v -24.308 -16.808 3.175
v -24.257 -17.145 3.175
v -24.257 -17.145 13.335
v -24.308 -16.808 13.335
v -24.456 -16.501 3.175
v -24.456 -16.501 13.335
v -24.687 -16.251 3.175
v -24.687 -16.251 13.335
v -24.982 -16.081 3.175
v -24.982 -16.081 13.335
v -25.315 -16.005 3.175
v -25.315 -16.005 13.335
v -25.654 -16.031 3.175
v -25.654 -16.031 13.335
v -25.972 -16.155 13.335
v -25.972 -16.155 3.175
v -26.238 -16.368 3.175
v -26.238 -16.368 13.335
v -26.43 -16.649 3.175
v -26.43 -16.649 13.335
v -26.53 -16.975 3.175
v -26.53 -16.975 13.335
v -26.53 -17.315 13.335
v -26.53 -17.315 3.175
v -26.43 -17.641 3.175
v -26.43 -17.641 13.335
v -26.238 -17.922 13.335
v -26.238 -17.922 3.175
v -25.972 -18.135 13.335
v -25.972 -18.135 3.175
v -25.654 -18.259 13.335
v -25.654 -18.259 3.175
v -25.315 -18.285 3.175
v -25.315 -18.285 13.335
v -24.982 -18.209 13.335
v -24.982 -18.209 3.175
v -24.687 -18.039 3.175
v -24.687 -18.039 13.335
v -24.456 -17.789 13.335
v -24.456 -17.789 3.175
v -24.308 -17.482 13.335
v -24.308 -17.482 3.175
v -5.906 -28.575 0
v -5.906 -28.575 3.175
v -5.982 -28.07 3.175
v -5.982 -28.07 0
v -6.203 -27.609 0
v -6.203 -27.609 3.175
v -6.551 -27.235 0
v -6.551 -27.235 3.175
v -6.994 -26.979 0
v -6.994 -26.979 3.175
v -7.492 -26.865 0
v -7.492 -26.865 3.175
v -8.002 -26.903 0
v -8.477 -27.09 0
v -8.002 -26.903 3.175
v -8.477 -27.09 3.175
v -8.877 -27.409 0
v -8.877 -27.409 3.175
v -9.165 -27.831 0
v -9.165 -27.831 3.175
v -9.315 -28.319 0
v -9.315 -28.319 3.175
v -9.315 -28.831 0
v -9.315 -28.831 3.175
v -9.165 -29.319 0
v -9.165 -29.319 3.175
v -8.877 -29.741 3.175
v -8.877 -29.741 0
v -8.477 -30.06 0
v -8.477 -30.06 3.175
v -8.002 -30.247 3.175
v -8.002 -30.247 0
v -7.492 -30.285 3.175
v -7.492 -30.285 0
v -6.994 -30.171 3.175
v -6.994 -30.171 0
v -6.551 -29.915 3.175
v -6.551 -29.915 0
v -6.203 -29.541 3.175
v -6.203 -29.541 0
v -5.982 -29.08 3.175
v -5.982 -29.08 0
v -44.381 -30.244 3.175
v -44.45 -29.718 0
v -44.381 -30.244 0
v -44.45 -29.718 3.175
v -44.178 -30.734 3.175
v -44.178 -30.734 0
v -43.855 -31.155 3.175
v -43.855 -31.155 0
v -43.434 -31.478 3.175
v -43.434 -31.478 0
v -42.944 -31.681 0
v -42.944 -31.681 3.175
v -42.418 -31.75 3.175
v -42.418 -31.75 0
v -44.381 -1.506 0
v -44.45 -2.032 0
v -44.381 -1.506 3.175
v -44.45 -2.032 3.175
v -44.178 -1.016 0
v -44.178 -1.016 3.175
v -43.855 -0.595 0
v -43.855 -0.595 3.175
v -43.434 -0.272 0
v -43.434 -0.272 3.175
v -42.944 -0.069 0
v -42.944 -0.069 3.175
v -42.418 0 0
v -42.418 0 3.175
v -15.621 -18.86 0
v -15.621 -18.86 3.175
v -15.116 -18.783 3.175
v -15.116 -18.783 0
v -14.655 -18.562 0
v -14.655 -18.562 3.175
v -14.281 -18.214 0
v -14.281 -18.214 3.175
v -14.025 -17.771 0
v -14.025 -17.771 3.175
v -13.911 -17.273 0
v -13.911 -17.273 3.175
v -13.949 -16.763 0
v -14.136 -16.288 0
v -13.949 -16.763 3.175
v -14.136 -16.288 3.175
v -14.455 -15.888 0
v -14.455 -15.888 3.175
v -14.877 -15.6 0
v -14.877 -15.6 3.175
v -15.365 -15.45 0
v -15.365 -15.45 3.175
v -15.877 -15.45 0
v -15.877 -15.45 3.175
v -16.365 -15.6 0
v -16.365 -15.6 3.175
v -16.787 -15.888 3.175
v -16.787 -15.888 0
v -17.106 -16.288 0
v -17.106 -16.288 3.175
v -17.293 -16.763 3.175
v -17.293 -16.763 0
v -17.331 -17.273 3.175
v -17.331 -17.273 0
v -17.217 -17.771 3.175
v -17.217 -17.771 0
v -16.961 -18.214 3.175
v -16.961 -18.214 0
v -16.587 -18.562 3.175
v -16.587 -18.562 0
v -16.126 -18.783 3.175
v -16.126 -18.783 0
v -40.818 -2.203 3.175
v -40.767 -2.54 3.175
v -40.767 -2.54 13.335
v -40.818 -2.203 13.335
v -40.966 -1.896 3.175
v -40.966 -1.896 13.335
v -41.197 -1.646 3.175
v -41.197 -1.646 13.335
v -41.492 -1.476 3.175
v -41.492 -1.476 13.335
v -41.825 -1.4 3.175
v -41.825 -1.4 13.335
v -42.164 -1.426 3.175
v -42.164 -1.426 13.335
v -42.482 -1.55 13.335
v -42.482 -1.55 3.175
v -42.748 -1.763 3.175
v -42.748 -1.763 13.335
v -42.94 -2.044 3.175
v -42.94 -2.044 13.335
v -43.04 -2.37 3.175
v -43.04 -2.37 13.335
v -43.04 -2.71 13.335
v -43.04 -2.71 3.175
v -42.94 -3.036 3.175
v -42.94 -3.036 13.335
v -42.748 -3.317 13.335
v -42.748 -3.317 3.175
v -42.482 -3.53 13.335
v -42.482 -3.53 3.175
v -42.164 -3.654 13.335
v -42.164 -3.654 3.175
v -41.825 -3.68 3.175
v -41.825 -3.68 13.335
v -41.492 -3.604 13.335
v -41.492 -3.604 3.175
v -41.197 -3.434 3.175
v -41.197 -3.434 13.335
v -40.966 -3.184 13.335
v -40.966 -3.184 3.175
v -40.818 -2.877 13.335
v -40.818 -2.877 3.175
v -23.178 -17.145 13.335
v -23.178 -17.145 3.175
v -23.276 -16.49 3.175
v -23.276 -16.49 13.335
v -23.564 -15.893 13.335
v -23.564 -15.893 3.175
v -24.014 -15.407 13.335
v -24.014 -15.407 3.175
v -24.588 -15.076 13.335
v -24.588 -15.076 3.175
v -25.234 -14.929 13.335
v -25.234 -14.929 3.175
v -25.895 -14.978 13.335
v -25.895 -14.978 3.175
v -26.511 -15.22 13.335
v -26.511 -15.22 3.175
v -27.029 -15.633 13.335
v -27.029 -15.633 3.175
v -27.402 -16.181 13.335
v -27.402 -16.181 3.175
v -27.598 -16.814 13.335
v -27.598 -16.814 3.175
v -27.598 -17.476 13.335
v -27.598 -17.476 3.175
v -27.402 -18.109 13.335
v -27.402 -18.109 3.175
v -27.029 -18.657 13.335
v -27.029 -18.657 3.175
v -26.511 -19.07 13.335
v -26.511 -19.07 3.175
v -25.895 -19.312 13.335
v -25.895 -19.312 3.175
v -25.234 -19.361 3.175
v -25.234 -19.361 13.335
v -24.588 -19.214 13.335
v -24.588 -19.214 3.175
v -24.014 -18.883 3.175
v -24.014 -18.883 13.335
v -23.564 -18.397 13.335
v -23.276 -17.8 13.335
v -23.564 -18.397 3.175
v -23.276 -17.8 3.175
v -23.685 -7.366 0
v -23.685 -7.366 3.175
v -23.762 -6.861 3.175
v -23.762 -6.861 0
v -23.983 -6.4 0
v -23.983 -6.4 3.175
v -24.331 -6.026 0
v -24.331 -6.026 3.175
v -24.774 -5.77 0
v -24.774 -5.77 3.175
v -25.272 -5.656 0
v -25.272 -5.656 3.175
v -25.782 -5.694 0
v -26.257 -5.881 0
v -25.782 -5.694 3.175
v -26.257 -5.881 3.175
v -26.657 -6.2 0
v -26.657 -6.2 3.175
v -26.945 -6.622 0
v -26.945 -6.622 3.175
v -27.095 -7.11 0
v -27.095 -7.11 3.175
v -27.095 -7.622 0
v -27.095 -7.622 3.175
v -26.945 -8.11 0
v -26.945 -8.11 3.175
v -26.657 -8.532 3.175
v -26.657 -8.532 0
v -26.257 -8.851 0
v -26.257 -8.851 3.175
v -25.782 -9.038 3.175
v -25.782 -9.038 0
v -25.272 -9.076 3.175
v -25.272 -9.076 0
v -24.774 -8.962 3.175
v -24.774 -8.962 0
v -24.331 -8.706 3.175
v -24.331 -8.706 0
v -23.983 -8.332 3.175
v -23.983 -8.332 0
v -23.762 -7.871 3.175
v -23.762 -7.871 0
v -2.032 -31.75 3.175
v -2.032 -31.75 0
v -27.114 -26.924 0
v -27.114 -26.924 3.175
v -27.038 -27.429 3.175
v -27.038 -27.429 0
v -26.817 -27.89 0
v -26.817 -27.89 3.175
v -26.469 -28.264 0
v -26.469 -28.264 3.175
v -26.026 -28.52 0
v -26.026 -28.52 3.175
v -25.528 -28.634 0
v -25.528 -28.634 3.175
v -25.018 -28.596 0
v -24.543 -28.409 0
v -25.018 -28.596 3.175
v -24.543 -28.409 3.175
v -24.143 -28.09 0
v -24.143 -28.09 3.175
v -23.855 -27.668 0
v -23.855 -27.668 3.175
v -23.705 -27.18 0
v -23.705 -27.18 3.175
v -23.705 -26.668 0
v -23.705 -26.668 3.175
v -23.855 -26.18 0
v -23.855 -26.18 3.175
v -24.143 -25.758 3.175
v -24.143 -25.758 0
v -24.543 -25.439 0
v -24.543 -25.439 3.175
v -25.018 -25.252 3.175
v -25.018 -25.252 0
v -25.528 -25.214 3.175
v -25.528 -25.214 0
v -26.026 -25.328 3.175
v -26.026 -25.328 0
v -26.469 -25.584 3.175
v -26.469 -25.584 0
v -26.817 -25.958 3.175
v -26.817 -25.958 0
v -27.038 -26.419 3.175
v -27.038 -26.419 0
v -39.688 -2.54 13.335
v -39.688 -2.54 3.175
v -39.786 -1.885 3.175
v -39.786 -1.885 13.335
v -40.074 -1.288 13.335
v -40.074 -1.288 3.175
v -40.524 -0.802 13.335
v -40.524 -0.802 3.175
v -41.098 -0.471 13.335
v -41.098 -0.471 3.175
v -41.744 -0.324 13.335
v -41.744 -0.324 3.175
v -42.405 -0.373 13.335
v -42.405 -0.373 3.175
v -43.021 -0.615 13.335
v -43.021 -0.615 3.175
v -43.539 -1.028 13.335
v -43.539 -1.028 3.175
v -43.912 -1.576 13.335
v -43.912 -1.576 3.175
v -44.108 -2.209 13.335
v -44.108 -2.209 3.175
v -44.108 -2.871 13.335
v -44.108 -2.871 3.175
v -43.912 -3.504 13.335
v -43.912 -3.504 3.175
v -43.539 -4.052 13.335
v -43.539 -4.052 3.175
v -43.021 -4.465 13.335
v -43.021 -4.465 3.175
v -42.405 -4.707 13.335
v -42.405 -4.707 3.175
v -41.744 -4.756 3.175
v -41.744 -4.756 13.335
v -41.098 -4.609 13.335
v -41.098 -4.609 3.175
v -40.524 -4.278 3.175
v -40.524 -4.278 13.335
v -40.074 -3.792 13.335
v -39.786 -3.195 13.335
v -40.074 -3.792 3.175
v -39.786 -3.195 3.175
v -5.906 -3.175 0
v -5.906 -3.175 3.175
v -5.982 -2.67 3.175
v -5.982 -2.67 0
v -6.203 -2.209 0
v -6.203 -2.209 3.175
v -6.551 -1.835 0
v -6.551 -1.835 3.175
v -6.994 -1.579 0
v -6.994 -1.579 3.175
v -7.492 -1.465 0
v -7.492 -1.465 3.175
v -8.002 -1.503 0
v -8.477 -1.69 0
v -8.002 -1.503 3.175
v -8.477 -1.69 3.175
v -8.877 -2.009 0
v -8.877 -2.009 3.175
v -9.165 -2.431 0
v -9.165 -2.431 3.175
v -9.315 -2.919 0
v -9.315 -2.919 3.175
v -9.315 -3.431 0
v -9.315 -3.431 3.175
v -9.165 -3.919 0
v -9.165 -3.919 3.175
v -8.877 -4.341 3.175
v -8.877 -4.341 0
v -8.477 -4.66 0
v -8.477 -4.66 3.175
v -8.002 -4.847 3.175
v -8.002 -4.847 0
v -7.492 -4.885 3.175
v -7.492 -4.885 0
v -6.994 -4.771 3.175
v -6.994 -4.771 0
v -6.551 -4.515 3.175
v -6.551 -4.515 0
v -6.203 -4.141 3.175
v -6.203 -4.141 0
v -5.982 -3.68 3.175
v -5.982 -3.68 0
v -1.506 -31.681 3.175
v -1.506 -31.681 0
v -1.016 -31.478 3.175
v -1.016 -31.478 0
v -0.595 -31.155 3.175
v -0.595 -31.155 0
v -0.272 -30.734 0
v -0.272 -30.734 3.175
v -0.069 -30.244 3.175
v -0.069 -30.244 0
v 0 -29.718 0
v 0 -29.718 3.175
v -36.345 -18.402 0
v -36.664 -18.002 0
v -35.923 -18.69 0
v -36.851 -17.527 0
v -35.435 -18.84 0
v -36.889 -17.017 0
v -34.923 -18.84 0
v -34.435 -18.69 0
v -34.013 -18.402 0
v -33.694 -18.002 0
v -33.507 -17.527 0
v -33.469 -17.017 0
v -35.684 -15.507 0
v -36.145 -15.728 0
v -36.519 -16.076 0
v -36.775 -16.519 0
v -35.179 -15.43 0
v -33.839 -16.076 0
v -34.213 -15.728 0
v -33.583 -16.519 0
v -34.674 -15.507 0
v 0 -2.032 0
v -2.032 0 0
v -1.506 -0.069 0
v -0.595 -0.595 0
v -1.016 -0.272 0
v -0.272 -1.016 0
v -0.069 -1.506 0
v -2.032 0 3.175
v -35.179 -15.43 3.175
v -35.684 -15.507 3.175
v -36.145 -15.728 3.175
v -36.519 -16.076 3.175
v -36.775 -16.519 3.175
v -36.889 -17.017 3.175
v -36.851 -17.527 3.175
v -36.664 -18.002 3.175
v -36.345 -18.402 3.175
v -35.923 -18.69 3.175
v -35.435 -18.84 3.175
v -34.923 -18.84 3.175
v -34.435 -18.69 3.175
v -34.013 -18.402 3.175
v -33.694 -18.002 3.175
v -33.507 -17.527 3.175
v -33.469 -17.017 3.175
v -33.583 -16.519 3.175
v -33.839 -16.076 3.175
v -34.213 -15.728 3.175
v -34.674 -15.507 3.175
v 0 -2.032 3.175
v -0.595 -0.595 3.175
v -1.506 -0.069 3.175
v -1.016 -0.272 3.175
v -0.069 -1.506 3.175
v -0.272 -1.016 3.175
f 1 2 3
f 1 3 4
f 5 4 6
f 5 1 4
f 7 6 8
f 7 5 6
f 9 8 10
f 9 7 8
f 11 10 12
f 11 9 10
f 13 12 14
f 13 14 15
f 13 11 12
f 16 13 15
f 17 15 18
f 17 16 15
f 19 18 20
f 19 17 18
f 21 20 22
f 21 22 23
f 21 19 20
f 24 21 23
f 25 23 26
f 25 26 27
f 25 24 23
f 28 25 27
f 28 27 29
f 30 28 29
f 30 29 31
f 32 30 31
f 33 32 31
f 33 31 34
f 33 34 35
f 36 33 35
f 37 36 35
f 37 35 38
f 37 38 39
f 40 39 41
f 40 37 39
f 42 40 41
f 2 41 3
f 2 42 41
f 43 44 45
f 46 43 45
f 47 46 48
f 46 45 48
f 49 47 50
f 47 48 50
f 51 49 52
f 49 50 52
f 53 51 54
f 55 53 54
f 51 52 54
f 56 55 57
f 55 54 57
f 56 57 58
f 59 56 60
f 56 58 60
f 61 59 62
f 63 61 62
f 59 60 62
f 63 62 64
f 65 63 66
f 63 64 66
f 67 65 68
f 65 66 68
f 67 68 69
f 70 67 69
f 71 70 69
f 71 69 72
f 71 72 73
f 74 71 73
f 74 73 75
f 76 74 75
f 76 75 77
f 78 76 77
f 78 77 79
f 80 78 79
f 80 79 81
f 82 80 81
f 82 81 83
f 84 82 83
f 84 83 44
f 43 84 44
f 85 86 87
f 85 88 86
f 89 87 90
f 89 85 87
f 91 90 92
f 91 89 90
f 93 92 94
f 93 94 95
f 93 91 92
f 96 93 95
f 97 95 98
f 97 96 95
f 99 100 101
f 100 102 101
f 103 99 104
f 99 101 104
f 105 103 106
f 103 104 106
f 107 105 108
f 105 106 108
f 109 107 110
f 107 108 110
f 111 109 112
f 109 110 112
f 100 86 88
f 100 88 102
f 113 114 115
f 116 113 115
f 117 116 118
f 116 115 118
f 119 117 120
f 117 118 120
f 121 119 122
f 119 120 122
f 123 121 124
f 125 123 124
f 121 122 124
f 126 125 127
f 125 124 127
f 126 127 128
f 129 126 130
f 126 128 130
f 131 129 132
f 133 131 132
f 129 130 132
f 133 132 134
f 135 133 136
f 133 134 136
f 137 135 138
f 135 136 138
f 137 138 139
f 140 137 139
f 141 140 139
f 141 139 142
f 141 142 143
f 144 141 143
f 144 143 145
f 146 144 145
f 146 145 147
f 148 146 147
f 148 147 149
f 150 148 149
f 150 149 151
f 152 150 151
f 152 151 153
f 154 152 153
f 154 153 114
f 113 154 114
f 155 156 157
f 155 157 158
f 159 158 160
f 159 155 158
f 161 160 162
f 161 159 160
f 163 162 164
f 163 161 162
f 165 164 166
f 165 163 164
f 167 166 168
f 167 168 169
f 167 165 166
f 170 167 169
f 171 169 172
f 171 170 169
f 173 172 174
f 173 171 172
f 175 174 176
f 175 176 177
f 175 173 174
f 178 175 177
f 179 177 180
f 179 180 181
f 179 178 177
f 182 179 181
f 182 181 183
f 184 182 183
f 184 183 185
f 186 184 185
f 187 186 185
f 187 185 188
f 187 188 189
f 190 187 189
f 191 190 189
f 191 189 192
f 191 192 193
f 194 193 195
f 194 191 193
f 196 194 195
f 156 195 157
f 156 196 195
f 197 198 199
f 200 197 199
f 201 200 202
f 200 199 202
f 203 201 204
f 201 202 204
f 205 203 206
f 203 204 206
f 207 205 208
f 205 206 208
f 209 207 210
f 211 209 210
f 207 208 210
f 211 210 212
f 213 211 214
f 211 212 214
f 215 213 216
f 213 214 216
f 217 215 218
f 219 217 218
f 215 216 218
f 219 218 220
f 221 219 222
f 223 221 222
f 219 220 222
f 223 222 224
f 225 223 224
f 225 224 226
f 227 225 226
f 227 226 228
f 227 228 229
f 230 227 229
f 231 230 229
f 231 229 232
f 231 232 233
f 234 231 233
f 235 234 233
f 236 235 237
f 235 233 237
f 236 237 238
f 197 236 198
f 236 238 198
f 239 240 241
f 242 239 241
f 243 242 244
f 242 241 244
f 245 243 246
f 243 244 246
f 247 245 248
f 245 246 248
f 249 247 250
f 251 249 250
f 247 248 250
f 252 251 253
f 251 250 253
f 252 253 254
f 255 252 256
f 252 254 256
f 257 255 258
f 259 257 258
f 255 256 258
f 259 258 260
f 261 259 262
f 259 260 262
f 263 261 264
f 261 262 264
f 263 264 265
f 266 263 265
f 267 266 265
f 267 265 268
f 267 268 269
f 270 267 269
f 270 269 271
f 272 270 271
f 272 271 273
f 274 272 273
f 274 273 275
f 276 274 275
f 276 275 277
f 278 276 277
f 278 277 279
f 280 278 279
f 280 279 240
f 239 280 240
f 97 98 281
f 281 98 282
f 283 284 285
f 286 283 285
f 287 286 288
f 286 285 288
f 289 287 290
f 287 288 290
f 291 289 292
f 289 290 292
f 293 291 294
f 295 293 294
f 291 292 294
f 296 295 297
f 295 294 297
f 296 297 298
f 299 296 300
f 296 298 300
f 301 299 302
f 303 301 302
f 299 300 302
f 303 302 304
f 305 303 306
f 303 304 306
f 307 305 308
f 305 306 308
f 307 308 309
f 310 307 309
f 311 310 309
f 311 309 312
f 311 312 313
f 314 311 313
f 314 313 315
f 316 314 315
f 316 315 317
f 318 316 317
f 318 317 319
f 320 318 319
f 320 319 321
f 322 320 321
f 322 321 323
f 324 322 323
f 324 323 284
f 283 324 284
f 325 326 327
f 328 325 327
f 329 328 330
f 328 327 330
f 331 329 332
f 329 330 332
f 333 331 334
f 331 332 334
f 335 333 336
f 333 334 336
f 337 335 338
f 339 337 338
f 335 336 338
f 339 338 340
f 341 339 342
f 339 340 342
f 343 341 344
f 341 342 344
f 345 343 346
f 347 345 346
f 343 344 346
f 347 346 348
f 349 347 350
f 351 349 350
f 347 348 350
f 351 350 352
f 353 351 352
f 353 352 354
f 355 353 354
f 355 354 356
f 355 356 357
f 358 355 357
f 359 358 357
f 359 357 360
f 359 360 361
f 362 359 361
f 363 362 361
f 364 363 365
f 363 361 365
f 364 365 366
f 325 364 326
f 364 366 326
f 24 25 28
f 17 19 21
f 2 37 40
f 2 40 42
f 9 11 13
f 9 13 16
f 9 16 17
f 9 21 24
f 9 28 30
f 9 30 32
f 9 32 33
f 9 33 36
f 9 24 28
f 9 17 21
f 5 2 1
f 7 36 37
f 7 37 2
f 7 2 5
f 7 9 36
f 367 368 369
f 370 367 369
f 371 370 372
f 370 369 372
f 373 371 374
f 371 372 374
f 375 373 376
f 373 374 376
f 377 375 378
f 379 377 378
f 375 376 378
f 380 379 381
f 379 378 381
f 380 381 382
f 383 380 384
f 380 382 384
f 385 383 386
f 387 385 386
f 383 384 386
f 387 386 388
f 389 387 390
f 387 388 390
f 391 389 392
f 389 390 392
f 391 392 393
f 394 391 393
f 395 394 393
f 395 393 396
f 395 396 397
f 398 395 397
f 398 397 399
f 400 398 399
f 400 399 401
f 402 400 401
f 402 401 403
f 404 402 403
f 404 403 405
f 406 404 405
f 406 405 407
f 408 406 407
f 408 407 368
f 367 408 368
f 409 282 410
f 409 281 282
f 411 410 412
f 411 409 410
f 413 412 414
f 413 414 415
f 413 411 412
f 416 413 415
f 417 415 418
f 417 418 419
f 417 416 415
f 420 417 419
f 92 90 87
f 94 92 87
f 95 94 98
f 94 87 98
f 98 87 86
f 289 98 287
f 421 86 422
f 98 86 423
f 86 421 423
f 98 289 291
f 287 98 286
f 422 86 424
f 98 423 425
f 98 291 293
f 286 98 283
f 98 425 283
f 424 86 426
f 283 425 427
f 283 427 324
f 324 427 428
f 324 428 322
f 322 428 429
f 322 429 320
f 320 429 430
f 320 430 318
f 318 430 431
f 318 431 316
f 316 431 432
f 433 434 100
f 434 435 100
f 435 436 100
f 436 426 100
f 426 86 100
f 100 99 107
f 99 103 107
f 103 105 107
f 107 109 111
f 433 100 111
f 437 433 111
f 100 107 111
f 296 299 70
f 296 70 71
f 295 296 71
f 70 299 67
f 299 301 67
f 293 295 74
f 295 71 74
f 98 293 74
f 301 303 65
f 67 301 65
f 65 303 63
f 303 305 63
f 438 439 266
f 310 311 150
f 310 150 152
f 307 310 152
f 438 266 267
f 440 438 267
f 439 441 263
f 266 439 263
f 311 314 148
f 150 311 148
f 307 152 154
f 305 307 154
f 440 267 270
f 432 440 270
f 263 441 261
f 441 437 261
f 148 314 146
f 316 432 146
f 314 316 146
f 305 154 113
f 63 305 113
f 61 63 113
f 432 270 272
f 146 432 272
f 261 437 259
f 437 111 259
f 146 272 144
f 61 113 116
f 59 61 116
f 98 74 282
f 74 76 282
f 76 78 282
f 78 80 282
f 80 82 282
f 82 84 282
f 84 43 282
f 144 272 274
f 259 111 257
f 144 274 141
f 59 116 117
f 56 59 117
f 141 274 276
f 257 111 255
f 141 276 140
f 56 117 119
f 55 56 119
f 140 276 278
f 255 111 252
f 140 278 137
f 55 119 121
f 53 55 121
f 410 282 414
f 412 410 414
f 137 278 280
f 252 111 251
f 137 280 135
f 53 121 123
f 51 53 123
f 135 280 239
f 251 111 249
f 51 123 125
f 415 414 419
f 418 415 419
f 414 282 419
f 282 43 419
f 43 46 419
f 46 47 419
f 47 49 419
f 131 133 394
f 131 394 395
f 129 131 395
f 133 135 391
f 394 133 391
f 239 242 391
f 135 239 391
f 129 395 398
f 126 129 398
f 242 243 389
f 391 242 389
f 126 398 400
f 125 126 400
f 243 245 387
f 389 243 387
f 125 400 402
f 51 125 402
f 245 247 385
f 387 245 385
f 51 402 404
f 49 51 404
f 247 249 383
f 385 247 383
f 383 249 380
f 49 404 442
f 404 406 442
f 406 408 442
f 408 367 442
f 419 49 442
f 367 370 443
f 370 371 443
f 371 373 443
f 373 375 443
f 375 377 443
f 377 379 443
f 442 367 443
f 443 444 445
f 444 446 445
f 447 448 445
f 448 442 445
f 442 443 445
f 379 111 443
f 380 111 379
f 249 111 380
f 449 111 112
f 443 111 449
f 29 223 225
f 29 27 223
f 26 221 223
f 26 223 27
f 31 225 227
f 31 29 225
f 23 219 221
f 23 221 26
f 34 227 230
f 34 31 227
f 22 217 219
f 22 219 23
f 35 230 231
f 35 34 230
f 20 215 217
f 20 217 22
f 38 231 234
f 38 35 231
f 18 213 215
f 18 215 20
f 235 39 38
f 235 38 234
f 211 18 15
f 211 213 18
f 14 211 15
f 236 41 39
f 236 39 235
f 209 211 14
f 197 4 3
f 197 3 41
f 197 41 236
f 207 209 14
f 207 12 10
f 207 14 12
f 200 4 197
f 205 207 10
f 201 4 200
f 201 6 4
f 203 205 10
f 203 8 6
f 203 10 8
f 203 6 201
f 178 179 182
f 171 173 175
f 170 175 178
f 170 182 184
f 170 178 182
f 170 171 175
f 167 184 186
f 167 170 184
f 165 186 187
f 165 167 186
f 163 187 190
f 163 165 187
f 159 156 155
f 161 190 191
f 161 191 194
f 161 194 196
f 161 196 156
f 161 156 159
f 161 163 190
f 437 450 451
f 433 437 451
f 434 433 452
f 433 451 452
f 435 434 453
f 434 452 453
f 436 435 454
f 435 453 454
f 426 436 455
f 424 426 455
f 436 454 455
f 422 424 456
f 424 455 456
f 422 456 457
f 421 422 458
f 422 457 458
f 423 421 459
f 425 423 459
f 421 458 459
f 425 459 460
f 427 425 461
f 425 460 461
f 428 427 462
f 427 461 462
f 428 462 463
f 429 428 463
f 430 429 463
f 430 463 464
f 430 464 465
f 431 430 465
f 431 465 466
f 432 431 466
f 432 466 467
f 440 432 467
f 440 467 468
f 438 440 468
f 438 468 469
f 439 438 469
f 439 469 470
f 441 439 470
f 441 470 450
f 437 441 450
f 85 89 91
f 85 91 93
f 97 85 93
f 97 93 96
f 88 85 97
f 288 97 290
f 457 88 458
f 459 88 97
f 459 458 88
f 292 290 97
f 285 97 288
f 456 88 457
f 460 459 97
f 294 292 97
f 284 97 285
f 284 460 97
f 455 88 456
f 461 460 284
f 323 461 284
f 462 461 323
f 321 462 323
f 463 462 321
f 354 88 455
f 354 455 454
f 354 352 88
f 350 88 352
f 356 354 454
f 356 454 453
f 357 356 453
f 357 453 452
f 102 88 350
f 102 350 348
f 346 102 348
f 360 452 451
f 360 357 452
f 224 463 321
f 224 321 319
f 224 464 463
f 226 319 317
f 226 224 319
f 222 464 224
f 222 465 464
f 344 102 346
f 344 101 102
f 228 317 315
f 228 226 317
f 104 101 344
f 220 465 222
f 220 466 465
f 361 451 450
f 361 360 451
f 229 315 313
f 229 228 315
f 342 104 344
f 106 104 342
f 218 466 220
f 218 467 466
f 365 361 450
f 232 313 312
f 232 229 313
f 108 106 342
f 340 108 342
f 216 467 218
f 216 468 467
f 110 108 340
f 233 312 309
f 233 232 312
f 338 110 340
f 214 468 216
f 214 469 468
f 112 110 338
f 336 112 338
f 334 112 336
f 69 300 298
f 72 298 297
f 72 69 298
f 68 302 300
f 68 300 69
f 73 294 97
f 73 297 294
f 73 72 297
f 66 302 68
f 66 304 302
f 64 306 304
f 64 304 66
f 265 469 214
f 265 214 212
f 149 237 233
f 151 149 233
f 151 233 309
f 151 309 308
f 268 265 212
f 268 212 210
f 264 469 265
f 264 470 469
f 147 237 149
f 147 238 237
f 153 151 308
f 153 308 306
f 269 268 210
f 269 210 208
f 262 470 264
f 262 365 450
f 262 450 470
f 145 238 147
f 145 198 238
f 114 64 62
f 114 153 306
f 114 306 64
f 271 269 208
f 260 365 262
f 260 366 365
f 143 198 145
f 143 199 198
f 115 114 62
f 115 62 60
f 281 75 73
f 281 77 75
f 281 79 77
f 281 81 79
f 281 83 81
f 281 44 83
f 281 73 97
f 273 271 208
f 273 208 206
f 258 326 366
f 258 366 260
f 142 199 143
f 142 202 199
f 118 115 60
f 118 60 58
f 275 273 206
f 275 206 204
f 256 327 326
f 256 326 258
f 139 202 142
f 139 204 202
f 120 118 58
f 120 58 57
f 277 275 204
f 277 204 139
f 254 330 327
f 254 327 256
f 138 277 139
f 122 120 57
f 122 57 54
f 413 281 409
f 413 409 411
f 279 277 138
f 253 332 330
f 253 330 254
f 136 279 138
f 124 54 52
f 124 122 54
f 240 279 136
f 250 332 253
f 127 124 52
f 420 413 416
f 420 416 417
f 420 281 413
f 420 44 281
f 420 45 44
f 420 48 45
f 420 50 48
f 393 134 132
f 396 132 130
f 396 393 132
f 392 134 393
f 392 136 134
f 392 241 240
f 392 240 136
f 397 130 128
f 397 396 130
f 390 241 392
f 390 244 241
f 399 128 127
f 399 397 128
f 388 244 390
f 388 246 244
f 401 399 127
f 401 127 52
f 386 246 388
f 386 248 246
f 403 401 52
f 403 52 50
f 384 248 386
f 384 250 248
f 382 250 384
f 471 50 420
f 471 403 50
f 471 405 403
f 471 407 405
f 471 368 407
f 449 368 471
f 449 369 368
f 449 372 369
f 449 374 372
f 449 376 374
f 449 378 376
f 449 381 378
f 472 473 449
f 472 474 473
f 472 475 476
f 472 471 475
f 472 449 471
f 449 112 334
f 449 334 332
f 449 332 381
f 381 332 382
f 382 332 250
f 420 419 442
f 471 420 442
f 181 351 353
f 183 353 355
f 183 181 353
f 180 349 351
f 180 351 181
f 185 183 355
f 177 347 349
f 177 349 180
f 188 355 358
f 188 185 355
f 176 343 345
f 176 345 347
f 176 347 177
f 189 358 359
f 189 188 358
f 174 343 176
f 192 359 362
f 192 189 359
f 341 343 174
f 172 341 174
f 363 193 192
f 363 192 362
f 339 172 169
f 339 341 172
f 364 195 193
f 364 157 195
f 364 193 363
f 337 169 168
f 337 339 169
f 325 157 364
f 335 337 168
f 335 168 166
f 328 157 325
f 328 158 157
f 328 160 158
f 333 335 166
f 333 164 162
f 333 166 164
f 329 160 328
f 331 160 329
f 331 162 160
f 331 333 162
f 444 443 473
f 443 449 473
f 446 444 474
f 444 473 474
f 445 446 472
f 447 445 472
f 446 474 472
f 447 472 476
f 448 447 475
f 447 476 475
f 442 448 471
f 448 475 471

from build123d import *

# Parameters (mm, degrees)
SKETCH1_W           = 44.45
SKETCH1_H           = 31.75
BOSS_EXTRUDE1_DEPTH = 3.175
SKETCH2_R           = 2.2225
SKETCH2_R_2         = 1.143
BOSS_EXTRUDE2_DEPTH = 10.16
SKETCH3_R           = 1.7145
CUT_EXTRUDE1_DEPTH  = 12.7
SKETCH4_R           = 1.7145
CUT_EXTRUDE2_DEPTH  = 12.7
CIRPATTERN1_COUNT   = 4
FILLET1_R           = 2.032


with BuildPart() as part:
    # Sketch1 → Boss-Extrude1 (new body)
    with BuildSketch(Plane.XY):
        with Locations((-22.225, -15.875)):
            Rectangle(SKETCH1_W, SKETCH1_H)
    extrude(amount=BOSS_EXTRUDE1_DEPTH)

    # Sketch2 → Boss-Extrude2 (add)
    with BuildSketch(Plane.XY.offset(3.175)):
        with Locations((-41.91, -2.54)):
            Circle(SKETCH2_R)
        with Locations((-41.91, -2.54)):
            Circle(SKETCH2_R_2, mode=Mode.SUBTRACT)
        with Locations((-25.4, -17.145)):
            Circle(SKETCH2_R)
        with Locations((-25.4, -17.145)):
            Circle(SKETCH2_R_2, mode=Mode.SUBTRACT)
    extrude(amount=BOSS_EXTRUDE2_DEPTH)

    # Sketch3 → Cut-Extrude1 (cut)
    with BuildSketch(Plane.XY.offset(3.175)):
        with Locations((-7.62, -3.175)):
            Circle(SKETCH3_R)
        with Locations((-7.62, -28.575)):
            Circle(SKETCH3_R)
    extrude(amount=-CUT_EXTRUDE1_DEPTH, mode=Mode.SUBTRACT)

    # Sketch4 → Cut-Extrude2 (cut)
    with BuildSketch(Plane.XY.offset(3.175)):
        with Locations((-25.4, -7.366)):
            Circle(SKETCH4_R)
    cut_extrude2 = extrude(amount=-CUT_EXTRUDE2_DEPTH, mode=Mode.SUBTRACT)

    # CirPattern1: Cut-Extrude2 ×4 about axis
    cirpattern1_axis = Axis((-25.4, -17.145, 0), (0, 0, 1))
    for i in range(1, CIRPATTERN1_COUNT):
        add(cut_extrude2.rotate(cirpattern1_axis, i * 360 / CIRPATTERN1_COUNT), mode=Mode.SUBTRACT)

    # Fillet1
    fillet1_edges = [part.edges().sort_by_distance(p)[0] for p in [
        (0, -31.75, 1.5875),
        (-44.45, -31.75, 1.5875),
        (-44.45, 0, 1.5875),
        (0, 0, 1.5875),
    ]]
    fillet(fillet1_edges, radius=FILLET1_R)


solid = part.part
